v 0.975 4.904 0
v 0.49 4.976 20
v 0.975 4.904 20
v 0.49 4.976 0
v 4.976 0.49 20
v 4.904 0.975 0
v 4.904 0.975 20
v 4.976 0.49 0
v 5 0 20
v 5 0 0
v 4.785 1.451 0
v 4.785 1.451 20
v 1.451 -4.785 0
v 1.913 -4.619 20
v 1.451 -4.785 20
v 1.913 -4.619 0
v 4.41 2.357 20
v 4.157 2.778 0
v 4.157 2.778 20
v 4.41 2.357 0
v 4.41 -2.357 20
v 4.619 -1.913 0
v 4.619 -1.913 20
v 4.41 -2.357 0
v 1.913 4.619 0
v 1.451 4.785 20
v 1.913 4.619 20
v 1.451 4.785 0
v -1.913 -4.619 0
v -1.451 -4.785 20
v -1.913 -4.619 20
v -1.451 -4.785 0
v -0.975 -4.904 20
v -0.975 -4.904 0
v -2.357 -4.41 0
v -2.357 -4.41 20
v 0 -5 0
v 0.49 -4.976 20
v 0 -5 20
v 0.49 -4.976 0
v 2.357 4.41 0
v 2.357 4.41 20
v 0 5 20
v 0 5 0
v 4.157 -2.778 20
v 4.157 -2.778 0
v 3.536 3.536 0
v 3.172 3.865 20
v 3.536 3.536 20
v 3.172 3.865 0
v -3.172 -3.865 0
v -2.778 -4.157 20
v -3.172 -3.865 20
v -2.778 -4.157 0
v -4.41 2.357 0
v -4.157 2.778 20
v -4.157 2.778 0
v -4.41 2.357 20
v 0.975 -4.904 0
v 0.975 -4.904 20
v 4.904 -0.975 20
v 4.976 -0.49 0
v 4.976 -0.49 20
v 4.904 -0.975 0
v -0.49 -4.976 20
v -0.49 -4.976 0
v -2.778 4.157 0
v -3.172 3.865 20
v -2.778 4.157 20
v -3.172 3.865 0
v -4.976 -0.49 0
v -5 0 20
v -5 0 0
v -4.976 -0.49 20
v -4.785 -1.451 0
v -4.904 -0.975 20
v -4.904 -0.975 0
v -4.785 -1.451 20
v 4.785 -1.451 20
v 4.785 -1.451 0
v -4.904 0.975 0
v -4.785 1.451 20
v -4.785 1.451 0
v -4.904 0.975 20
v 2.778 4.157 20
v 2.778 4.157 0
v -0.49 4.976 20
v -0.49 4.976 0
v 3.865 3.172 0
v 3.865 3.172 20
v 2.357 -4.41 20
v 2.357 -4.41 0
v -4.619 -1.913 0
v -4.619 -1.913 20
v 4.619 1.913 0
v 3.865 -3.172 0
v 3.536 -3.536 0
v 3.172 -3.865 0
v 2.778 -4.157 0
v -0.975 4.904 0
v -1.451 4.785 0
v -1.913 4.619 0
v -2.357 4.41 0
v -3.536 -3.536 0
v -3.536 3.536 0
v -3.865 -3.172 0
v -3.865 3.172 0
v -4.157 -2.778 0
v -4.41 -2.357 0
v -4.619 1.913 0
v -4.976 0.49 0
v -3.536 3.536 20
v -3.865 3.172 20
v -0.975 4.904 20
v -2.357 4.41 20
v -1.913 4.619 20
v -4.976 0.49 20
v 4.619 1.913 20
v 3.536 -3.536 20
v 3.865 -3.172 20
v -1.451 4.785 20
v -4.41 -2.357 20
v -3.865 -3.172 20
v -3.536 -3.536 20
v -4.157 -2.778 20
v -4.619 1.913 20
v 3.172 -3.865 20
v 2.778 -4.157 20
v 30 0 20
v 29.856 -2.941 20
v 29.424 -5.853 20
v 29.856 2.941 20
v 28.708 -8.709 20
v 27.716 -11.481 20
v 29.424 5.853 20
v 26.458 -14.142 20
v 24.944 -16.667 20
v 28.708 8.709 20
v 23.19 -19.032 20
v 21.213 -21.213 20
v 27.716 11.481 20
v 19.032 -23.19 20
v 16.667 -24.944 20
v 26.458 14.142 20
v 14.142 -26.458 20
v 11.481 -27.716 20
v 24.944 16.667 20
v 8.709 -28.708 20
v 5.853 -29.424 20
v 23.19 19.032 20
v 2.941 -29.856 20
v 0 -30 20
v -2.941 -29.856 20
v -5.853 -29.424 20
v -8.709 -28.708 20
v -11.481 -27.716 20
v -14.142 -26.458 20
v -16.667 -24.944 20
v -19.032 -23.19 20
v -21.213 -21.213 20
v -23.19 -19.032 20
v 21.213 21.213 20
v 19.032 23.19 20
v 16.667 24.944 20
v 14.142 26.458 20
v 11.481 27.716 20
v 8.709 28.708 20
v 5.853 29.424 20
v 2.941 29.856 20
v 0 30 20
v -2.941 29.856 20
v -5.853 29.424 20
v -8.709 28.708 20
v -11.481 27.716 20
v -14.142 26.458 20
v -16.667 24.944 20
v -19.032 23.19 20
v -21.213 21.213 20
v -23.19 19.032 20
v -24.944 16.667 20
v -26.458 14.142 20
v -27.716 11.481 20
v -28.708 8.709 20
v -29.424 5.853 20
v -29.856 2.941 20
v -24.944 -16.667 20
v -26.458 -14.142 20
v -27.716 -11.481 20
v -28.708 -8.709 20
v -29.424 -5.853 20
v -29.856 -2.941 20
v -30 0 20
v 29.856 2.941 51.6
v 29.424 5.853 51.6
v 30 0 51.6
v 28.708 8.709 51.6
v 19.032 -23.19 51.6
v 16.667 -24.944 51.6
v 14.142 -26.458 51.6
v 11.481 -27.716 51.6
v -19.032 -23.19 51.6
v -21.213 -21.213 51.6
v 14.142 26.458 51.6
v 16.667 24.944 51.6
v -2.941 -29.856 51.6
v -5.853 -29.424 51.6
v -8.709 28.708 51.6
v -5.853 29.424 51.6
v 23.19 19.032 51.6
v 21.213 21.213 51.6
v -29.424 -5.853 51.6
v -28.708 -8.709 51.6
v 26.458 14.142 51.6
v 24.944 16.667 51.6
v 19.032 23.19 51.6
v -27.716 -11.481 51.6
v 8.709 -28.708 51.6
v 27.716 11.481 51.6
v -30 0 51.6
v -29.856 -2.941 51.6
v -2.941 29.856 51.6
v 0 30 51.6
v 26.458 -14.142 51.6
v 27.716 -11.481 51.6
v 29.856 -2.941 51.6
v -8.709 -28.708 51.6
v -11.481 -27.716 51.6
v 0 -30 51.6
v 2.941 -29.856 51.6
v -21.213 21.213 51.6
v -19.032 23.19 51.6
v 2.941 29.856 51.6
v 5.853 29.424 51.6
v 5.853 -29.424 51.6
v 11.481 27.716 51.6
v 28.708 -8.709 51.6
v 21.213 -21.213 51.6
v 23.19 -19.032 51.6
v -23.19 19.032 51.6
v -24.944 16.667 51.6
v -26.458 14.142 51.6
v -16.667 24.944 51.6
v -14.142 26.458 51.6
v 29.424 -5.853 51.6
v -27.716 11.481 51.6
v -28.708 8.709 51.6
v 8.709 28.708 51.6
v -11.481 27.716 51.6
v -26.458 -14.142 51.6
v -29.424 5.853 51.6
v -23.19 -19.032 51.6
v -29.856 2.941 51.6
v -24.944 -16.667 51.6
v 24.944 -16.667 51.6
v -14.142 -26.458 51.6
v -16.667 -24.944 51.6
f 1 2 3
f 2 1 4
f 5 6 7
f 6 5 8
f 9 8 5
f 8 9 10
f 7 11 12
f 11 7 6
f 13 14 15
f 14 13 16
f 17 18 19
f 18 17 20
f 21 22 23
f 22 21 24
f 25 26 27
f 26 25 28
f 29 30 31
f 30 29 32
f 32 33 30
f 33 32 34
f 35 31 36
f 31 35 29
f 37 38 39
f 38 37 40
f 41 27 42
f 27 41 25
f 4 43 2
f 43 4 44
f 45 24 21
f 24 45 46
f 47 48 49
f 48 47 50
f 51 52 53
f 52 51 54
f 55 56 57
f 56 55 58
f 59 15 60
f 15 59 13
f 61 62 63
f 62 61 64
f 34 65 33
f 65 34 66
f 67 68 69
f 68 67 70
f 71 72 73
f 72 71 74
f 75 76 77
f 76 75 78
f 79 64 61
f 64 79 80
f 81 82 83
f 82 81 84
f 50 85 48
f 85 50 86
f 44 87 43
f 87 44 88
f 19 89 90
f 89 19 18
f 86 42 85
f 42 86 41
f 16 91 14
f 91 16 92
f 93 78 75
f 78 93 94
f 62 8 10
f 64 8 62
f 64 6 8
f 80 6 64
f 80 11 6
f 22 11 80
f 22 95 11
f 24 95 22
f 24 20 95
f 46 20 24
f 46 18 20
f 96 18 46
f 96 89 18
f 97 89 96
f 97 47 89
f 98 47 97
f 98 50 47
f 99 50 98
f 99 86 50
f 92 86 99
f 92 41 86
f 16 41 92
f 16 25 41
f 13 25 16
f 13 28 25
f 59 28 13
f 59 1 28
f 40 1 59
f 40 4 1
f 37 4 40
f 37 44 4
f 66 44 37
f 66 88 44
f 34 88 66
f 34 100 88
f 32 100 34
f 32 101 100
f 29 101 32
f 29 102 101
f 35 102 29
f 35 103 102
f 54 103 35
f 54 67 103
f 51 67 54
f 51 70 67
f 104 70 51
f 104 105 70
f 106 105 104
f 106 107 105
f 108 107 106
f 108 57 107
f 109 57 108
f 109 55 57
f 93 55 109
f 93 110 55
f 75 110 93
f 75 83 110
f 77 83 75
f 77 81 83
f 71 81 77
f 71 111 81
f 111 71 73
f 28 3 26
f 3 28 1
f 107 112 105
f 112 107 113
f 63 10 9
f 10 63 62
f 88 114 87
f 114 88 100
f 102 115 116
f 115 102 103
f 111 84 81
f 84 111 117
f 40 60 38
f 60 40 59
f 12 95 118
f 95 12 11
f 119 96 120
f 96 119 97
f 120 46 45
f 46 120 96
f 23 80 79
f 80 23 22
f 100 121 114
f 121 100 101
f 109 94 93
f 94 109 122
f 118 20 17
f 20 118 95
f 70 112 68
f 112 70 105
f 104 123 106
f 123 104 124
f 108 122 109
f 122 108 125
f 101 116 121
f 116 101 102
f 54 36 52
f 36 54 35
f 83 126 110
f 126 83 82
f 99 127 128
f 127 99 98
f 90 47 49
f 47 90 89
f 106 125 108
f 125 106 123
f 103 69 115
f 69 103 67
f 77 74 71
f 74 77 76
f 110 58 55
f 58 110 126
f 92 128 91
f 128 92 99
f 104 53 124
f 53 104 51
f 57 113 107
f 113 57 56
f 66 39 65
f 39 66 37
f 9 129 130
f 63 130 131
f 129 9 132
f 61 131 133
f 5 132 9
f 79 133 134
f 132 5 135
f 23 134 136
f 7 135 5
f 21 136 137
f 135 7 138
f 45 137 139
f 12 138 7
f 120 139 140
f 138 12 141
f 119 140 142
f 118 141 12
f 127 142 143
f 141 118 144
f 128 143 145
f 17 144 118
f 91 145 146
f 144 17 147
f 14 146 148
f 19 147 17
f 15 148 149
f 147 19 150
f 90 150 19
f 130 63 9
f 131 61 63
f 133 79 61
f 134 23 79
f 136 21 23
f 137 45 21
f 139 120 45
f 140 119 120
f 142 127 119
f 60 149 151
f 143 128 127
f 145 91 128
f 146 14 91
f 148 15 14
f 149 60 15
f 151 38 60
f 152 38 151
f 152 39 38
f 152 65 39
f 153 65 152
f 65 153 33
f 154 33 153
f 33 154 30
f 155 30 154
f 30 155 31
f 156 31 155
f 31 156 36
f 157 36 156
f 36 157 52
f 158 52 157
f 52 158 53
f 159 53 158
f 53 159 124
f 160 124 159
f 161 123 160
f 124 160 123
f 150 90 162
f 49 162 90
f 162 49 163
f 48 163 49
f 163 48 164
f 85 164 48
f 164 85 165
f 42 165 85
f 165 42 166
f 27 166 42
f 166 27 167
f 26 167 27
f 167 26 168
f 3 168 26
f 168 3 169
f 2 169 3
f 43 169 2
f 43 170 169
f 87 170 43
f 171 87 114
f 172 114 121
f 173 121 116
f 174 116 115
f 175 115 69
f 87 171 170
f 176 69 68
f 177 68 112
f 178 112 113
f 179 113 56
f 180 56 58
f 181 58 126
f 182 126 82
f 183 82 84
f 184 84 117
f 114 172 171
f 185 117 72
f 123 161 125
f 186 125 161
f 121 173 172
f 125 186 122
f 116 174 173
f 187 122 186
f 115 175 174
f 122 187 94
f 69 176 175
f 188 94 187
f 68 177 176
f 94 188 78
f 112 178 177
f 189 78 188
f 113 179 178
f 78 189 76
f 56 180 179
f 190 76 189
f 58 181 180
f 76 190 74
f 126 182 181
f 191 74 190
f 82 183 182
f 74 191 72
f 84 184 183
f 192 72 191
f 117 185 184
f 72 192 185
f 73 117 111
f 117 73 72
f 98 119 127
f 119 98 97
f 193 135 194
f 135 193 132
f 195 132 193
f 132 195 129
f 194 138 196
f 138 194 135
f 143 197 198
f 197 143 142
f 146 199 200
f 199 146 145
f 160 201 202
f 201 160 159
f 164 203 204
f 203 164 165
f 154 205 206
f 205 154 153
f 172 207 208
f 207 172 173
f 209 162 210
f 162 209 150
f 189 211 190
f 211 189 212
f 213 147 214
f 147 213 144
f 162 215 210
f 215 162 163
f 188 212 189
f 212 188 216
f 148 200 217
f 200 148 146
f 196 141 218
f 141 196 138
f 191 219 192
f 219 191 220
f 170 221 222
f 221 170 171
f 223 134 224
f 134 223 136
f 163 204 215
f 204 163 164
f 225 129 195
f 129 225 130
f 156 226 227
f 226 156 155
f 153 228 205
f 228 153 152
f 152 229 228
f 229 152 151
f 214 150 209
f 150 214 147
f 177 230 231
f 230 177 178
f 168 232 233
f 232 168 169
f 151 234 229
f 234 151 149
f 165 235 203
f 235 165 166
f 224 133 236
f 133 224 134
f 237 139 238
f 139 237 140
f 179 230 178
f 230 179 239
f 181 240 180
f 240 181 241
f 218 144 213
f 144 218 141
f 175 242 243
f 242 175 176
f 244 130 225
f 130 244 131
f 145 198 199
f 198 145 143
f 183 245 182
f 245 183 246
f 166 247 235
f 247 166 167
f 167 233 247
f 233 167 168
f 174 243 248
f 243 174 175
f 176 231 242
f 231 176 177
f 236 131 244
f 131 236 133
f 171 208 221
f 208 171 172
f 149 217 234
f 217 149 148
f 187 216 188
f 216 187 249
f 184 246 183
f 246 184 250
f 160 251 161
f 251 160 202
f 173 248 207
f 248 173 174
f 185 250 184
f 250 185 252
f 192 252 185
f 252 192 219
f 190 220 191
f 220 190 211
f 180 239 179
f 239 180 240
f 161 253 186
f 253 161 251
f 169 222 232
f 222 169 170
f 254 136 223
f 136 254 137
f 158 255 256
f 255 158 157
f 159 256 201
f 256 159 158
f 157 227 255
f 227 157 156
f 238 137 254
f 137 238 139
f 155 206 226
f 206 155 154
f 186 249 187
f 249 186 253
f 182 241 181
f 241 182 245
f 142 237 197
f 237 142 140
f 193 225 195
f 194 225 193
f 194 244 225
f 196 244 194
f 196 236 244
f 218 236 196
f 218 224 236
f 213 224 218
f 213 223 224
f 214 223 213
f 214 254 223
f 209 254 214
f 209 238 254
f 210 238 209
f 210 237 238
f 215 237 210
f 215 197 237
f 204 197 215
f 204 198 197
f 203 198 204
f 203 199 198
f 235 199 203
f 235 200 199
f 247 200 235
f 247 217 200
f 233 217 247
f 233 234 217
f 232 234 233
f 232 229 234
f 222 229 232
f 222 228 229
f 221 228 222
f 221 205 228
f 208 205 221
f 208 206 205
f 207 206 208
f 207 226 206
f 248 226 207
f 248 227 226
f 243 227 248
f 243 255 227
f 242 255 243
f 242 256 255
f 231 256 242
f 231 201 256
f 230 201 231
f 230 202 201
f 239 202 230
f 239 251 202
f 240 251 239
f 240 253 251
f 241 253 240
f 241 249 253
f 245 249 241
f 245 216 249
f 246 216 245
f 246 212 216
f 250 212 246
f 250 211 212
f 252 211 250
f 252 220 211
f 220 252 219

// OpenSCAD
// Lab Funnel Design
// Units: mm
// Orientation: Upright, resting on XY plane at z=0

// Dimensions
spout_od = 10;        // Outer diameter of the spout
spout_length = 20;    // Length of the straight spout
funnel_bottom_z = 20; // Z position where the cone starts
funnel_top_z = 50;    // Z position of the funnel rim
wall_thickness = 1.6; // Thickness of the funnel walls
rim_thickness = 1.6;  // Thickness of the rim (same as wall)

// Derived Dimensions
spout_id = spout_od - (2 * wall_thickness); // Inner diameter of spout
funnel_od_top = 60;                          // Outer diameter at the rim
funnel_od_bottom = spout_od;                 // Outer diameter at the cone start
funnel_id_top = funnel_od_top - (2 * wall_thickness); // Inner diameter at the rim
funnel_id_bottom = spout_id;                // Inner diameter at the cone start

// Rendering
$fn = 64;

// Main Body
union() {
    // 1. Straight Spout (Tube)
    // We create a cylinder for the outer wall and subtract the inner bore
    translate([0, 0, 0])
    cylinder(h = spout_length, d = spout_od, center = false);
    
    difference() {
        // Inner bore of the spout
        cylinder(h = spout_length, d = spout_id, center = false);
        
        // Optional: Add a small chamfer or rounded edge at the bottom of the spout
        // to prevent sharp edges that might tear the print bed or catch liquid
        translate([0, 0, -0.1])
        cylinder(h = 0.2, d = spout_id + 0.5, center = false);
    }

    // 2. Funnel Cone
    // The cone starts at z = funnel_bottom_z
    // We use a cylinder with a large diameter and subtract a smaller cylinder
    // to create the conical volume.
    
    // Outer Cone
    translate([0, 0, funnel_bottom_z])
    cylinder(h = (funnel_top_z - funnel_bottom_z), d = funnel_od_top, center = false);
    
    // Inner Cone (Bore)
    translate([0, 0, funnel_bottom_z])
    cylinder(h = (funnel_top_z - funnel_bottom_z), d = funnel_id_top, center = false);
    
    // 3. Rim
    // A flat ring at the top of the funnel
    translate([0, 0, funnel_top_z])
    cylinder(h = rim_thickness, d = funnel_od_top, center = false);
    
    // Rim Bore (Hole for liquid)
    translate([0, 0, funnel_top_z])
    cylinder(h = rim_thickness, d = funnel_id_top, center = false);
}
